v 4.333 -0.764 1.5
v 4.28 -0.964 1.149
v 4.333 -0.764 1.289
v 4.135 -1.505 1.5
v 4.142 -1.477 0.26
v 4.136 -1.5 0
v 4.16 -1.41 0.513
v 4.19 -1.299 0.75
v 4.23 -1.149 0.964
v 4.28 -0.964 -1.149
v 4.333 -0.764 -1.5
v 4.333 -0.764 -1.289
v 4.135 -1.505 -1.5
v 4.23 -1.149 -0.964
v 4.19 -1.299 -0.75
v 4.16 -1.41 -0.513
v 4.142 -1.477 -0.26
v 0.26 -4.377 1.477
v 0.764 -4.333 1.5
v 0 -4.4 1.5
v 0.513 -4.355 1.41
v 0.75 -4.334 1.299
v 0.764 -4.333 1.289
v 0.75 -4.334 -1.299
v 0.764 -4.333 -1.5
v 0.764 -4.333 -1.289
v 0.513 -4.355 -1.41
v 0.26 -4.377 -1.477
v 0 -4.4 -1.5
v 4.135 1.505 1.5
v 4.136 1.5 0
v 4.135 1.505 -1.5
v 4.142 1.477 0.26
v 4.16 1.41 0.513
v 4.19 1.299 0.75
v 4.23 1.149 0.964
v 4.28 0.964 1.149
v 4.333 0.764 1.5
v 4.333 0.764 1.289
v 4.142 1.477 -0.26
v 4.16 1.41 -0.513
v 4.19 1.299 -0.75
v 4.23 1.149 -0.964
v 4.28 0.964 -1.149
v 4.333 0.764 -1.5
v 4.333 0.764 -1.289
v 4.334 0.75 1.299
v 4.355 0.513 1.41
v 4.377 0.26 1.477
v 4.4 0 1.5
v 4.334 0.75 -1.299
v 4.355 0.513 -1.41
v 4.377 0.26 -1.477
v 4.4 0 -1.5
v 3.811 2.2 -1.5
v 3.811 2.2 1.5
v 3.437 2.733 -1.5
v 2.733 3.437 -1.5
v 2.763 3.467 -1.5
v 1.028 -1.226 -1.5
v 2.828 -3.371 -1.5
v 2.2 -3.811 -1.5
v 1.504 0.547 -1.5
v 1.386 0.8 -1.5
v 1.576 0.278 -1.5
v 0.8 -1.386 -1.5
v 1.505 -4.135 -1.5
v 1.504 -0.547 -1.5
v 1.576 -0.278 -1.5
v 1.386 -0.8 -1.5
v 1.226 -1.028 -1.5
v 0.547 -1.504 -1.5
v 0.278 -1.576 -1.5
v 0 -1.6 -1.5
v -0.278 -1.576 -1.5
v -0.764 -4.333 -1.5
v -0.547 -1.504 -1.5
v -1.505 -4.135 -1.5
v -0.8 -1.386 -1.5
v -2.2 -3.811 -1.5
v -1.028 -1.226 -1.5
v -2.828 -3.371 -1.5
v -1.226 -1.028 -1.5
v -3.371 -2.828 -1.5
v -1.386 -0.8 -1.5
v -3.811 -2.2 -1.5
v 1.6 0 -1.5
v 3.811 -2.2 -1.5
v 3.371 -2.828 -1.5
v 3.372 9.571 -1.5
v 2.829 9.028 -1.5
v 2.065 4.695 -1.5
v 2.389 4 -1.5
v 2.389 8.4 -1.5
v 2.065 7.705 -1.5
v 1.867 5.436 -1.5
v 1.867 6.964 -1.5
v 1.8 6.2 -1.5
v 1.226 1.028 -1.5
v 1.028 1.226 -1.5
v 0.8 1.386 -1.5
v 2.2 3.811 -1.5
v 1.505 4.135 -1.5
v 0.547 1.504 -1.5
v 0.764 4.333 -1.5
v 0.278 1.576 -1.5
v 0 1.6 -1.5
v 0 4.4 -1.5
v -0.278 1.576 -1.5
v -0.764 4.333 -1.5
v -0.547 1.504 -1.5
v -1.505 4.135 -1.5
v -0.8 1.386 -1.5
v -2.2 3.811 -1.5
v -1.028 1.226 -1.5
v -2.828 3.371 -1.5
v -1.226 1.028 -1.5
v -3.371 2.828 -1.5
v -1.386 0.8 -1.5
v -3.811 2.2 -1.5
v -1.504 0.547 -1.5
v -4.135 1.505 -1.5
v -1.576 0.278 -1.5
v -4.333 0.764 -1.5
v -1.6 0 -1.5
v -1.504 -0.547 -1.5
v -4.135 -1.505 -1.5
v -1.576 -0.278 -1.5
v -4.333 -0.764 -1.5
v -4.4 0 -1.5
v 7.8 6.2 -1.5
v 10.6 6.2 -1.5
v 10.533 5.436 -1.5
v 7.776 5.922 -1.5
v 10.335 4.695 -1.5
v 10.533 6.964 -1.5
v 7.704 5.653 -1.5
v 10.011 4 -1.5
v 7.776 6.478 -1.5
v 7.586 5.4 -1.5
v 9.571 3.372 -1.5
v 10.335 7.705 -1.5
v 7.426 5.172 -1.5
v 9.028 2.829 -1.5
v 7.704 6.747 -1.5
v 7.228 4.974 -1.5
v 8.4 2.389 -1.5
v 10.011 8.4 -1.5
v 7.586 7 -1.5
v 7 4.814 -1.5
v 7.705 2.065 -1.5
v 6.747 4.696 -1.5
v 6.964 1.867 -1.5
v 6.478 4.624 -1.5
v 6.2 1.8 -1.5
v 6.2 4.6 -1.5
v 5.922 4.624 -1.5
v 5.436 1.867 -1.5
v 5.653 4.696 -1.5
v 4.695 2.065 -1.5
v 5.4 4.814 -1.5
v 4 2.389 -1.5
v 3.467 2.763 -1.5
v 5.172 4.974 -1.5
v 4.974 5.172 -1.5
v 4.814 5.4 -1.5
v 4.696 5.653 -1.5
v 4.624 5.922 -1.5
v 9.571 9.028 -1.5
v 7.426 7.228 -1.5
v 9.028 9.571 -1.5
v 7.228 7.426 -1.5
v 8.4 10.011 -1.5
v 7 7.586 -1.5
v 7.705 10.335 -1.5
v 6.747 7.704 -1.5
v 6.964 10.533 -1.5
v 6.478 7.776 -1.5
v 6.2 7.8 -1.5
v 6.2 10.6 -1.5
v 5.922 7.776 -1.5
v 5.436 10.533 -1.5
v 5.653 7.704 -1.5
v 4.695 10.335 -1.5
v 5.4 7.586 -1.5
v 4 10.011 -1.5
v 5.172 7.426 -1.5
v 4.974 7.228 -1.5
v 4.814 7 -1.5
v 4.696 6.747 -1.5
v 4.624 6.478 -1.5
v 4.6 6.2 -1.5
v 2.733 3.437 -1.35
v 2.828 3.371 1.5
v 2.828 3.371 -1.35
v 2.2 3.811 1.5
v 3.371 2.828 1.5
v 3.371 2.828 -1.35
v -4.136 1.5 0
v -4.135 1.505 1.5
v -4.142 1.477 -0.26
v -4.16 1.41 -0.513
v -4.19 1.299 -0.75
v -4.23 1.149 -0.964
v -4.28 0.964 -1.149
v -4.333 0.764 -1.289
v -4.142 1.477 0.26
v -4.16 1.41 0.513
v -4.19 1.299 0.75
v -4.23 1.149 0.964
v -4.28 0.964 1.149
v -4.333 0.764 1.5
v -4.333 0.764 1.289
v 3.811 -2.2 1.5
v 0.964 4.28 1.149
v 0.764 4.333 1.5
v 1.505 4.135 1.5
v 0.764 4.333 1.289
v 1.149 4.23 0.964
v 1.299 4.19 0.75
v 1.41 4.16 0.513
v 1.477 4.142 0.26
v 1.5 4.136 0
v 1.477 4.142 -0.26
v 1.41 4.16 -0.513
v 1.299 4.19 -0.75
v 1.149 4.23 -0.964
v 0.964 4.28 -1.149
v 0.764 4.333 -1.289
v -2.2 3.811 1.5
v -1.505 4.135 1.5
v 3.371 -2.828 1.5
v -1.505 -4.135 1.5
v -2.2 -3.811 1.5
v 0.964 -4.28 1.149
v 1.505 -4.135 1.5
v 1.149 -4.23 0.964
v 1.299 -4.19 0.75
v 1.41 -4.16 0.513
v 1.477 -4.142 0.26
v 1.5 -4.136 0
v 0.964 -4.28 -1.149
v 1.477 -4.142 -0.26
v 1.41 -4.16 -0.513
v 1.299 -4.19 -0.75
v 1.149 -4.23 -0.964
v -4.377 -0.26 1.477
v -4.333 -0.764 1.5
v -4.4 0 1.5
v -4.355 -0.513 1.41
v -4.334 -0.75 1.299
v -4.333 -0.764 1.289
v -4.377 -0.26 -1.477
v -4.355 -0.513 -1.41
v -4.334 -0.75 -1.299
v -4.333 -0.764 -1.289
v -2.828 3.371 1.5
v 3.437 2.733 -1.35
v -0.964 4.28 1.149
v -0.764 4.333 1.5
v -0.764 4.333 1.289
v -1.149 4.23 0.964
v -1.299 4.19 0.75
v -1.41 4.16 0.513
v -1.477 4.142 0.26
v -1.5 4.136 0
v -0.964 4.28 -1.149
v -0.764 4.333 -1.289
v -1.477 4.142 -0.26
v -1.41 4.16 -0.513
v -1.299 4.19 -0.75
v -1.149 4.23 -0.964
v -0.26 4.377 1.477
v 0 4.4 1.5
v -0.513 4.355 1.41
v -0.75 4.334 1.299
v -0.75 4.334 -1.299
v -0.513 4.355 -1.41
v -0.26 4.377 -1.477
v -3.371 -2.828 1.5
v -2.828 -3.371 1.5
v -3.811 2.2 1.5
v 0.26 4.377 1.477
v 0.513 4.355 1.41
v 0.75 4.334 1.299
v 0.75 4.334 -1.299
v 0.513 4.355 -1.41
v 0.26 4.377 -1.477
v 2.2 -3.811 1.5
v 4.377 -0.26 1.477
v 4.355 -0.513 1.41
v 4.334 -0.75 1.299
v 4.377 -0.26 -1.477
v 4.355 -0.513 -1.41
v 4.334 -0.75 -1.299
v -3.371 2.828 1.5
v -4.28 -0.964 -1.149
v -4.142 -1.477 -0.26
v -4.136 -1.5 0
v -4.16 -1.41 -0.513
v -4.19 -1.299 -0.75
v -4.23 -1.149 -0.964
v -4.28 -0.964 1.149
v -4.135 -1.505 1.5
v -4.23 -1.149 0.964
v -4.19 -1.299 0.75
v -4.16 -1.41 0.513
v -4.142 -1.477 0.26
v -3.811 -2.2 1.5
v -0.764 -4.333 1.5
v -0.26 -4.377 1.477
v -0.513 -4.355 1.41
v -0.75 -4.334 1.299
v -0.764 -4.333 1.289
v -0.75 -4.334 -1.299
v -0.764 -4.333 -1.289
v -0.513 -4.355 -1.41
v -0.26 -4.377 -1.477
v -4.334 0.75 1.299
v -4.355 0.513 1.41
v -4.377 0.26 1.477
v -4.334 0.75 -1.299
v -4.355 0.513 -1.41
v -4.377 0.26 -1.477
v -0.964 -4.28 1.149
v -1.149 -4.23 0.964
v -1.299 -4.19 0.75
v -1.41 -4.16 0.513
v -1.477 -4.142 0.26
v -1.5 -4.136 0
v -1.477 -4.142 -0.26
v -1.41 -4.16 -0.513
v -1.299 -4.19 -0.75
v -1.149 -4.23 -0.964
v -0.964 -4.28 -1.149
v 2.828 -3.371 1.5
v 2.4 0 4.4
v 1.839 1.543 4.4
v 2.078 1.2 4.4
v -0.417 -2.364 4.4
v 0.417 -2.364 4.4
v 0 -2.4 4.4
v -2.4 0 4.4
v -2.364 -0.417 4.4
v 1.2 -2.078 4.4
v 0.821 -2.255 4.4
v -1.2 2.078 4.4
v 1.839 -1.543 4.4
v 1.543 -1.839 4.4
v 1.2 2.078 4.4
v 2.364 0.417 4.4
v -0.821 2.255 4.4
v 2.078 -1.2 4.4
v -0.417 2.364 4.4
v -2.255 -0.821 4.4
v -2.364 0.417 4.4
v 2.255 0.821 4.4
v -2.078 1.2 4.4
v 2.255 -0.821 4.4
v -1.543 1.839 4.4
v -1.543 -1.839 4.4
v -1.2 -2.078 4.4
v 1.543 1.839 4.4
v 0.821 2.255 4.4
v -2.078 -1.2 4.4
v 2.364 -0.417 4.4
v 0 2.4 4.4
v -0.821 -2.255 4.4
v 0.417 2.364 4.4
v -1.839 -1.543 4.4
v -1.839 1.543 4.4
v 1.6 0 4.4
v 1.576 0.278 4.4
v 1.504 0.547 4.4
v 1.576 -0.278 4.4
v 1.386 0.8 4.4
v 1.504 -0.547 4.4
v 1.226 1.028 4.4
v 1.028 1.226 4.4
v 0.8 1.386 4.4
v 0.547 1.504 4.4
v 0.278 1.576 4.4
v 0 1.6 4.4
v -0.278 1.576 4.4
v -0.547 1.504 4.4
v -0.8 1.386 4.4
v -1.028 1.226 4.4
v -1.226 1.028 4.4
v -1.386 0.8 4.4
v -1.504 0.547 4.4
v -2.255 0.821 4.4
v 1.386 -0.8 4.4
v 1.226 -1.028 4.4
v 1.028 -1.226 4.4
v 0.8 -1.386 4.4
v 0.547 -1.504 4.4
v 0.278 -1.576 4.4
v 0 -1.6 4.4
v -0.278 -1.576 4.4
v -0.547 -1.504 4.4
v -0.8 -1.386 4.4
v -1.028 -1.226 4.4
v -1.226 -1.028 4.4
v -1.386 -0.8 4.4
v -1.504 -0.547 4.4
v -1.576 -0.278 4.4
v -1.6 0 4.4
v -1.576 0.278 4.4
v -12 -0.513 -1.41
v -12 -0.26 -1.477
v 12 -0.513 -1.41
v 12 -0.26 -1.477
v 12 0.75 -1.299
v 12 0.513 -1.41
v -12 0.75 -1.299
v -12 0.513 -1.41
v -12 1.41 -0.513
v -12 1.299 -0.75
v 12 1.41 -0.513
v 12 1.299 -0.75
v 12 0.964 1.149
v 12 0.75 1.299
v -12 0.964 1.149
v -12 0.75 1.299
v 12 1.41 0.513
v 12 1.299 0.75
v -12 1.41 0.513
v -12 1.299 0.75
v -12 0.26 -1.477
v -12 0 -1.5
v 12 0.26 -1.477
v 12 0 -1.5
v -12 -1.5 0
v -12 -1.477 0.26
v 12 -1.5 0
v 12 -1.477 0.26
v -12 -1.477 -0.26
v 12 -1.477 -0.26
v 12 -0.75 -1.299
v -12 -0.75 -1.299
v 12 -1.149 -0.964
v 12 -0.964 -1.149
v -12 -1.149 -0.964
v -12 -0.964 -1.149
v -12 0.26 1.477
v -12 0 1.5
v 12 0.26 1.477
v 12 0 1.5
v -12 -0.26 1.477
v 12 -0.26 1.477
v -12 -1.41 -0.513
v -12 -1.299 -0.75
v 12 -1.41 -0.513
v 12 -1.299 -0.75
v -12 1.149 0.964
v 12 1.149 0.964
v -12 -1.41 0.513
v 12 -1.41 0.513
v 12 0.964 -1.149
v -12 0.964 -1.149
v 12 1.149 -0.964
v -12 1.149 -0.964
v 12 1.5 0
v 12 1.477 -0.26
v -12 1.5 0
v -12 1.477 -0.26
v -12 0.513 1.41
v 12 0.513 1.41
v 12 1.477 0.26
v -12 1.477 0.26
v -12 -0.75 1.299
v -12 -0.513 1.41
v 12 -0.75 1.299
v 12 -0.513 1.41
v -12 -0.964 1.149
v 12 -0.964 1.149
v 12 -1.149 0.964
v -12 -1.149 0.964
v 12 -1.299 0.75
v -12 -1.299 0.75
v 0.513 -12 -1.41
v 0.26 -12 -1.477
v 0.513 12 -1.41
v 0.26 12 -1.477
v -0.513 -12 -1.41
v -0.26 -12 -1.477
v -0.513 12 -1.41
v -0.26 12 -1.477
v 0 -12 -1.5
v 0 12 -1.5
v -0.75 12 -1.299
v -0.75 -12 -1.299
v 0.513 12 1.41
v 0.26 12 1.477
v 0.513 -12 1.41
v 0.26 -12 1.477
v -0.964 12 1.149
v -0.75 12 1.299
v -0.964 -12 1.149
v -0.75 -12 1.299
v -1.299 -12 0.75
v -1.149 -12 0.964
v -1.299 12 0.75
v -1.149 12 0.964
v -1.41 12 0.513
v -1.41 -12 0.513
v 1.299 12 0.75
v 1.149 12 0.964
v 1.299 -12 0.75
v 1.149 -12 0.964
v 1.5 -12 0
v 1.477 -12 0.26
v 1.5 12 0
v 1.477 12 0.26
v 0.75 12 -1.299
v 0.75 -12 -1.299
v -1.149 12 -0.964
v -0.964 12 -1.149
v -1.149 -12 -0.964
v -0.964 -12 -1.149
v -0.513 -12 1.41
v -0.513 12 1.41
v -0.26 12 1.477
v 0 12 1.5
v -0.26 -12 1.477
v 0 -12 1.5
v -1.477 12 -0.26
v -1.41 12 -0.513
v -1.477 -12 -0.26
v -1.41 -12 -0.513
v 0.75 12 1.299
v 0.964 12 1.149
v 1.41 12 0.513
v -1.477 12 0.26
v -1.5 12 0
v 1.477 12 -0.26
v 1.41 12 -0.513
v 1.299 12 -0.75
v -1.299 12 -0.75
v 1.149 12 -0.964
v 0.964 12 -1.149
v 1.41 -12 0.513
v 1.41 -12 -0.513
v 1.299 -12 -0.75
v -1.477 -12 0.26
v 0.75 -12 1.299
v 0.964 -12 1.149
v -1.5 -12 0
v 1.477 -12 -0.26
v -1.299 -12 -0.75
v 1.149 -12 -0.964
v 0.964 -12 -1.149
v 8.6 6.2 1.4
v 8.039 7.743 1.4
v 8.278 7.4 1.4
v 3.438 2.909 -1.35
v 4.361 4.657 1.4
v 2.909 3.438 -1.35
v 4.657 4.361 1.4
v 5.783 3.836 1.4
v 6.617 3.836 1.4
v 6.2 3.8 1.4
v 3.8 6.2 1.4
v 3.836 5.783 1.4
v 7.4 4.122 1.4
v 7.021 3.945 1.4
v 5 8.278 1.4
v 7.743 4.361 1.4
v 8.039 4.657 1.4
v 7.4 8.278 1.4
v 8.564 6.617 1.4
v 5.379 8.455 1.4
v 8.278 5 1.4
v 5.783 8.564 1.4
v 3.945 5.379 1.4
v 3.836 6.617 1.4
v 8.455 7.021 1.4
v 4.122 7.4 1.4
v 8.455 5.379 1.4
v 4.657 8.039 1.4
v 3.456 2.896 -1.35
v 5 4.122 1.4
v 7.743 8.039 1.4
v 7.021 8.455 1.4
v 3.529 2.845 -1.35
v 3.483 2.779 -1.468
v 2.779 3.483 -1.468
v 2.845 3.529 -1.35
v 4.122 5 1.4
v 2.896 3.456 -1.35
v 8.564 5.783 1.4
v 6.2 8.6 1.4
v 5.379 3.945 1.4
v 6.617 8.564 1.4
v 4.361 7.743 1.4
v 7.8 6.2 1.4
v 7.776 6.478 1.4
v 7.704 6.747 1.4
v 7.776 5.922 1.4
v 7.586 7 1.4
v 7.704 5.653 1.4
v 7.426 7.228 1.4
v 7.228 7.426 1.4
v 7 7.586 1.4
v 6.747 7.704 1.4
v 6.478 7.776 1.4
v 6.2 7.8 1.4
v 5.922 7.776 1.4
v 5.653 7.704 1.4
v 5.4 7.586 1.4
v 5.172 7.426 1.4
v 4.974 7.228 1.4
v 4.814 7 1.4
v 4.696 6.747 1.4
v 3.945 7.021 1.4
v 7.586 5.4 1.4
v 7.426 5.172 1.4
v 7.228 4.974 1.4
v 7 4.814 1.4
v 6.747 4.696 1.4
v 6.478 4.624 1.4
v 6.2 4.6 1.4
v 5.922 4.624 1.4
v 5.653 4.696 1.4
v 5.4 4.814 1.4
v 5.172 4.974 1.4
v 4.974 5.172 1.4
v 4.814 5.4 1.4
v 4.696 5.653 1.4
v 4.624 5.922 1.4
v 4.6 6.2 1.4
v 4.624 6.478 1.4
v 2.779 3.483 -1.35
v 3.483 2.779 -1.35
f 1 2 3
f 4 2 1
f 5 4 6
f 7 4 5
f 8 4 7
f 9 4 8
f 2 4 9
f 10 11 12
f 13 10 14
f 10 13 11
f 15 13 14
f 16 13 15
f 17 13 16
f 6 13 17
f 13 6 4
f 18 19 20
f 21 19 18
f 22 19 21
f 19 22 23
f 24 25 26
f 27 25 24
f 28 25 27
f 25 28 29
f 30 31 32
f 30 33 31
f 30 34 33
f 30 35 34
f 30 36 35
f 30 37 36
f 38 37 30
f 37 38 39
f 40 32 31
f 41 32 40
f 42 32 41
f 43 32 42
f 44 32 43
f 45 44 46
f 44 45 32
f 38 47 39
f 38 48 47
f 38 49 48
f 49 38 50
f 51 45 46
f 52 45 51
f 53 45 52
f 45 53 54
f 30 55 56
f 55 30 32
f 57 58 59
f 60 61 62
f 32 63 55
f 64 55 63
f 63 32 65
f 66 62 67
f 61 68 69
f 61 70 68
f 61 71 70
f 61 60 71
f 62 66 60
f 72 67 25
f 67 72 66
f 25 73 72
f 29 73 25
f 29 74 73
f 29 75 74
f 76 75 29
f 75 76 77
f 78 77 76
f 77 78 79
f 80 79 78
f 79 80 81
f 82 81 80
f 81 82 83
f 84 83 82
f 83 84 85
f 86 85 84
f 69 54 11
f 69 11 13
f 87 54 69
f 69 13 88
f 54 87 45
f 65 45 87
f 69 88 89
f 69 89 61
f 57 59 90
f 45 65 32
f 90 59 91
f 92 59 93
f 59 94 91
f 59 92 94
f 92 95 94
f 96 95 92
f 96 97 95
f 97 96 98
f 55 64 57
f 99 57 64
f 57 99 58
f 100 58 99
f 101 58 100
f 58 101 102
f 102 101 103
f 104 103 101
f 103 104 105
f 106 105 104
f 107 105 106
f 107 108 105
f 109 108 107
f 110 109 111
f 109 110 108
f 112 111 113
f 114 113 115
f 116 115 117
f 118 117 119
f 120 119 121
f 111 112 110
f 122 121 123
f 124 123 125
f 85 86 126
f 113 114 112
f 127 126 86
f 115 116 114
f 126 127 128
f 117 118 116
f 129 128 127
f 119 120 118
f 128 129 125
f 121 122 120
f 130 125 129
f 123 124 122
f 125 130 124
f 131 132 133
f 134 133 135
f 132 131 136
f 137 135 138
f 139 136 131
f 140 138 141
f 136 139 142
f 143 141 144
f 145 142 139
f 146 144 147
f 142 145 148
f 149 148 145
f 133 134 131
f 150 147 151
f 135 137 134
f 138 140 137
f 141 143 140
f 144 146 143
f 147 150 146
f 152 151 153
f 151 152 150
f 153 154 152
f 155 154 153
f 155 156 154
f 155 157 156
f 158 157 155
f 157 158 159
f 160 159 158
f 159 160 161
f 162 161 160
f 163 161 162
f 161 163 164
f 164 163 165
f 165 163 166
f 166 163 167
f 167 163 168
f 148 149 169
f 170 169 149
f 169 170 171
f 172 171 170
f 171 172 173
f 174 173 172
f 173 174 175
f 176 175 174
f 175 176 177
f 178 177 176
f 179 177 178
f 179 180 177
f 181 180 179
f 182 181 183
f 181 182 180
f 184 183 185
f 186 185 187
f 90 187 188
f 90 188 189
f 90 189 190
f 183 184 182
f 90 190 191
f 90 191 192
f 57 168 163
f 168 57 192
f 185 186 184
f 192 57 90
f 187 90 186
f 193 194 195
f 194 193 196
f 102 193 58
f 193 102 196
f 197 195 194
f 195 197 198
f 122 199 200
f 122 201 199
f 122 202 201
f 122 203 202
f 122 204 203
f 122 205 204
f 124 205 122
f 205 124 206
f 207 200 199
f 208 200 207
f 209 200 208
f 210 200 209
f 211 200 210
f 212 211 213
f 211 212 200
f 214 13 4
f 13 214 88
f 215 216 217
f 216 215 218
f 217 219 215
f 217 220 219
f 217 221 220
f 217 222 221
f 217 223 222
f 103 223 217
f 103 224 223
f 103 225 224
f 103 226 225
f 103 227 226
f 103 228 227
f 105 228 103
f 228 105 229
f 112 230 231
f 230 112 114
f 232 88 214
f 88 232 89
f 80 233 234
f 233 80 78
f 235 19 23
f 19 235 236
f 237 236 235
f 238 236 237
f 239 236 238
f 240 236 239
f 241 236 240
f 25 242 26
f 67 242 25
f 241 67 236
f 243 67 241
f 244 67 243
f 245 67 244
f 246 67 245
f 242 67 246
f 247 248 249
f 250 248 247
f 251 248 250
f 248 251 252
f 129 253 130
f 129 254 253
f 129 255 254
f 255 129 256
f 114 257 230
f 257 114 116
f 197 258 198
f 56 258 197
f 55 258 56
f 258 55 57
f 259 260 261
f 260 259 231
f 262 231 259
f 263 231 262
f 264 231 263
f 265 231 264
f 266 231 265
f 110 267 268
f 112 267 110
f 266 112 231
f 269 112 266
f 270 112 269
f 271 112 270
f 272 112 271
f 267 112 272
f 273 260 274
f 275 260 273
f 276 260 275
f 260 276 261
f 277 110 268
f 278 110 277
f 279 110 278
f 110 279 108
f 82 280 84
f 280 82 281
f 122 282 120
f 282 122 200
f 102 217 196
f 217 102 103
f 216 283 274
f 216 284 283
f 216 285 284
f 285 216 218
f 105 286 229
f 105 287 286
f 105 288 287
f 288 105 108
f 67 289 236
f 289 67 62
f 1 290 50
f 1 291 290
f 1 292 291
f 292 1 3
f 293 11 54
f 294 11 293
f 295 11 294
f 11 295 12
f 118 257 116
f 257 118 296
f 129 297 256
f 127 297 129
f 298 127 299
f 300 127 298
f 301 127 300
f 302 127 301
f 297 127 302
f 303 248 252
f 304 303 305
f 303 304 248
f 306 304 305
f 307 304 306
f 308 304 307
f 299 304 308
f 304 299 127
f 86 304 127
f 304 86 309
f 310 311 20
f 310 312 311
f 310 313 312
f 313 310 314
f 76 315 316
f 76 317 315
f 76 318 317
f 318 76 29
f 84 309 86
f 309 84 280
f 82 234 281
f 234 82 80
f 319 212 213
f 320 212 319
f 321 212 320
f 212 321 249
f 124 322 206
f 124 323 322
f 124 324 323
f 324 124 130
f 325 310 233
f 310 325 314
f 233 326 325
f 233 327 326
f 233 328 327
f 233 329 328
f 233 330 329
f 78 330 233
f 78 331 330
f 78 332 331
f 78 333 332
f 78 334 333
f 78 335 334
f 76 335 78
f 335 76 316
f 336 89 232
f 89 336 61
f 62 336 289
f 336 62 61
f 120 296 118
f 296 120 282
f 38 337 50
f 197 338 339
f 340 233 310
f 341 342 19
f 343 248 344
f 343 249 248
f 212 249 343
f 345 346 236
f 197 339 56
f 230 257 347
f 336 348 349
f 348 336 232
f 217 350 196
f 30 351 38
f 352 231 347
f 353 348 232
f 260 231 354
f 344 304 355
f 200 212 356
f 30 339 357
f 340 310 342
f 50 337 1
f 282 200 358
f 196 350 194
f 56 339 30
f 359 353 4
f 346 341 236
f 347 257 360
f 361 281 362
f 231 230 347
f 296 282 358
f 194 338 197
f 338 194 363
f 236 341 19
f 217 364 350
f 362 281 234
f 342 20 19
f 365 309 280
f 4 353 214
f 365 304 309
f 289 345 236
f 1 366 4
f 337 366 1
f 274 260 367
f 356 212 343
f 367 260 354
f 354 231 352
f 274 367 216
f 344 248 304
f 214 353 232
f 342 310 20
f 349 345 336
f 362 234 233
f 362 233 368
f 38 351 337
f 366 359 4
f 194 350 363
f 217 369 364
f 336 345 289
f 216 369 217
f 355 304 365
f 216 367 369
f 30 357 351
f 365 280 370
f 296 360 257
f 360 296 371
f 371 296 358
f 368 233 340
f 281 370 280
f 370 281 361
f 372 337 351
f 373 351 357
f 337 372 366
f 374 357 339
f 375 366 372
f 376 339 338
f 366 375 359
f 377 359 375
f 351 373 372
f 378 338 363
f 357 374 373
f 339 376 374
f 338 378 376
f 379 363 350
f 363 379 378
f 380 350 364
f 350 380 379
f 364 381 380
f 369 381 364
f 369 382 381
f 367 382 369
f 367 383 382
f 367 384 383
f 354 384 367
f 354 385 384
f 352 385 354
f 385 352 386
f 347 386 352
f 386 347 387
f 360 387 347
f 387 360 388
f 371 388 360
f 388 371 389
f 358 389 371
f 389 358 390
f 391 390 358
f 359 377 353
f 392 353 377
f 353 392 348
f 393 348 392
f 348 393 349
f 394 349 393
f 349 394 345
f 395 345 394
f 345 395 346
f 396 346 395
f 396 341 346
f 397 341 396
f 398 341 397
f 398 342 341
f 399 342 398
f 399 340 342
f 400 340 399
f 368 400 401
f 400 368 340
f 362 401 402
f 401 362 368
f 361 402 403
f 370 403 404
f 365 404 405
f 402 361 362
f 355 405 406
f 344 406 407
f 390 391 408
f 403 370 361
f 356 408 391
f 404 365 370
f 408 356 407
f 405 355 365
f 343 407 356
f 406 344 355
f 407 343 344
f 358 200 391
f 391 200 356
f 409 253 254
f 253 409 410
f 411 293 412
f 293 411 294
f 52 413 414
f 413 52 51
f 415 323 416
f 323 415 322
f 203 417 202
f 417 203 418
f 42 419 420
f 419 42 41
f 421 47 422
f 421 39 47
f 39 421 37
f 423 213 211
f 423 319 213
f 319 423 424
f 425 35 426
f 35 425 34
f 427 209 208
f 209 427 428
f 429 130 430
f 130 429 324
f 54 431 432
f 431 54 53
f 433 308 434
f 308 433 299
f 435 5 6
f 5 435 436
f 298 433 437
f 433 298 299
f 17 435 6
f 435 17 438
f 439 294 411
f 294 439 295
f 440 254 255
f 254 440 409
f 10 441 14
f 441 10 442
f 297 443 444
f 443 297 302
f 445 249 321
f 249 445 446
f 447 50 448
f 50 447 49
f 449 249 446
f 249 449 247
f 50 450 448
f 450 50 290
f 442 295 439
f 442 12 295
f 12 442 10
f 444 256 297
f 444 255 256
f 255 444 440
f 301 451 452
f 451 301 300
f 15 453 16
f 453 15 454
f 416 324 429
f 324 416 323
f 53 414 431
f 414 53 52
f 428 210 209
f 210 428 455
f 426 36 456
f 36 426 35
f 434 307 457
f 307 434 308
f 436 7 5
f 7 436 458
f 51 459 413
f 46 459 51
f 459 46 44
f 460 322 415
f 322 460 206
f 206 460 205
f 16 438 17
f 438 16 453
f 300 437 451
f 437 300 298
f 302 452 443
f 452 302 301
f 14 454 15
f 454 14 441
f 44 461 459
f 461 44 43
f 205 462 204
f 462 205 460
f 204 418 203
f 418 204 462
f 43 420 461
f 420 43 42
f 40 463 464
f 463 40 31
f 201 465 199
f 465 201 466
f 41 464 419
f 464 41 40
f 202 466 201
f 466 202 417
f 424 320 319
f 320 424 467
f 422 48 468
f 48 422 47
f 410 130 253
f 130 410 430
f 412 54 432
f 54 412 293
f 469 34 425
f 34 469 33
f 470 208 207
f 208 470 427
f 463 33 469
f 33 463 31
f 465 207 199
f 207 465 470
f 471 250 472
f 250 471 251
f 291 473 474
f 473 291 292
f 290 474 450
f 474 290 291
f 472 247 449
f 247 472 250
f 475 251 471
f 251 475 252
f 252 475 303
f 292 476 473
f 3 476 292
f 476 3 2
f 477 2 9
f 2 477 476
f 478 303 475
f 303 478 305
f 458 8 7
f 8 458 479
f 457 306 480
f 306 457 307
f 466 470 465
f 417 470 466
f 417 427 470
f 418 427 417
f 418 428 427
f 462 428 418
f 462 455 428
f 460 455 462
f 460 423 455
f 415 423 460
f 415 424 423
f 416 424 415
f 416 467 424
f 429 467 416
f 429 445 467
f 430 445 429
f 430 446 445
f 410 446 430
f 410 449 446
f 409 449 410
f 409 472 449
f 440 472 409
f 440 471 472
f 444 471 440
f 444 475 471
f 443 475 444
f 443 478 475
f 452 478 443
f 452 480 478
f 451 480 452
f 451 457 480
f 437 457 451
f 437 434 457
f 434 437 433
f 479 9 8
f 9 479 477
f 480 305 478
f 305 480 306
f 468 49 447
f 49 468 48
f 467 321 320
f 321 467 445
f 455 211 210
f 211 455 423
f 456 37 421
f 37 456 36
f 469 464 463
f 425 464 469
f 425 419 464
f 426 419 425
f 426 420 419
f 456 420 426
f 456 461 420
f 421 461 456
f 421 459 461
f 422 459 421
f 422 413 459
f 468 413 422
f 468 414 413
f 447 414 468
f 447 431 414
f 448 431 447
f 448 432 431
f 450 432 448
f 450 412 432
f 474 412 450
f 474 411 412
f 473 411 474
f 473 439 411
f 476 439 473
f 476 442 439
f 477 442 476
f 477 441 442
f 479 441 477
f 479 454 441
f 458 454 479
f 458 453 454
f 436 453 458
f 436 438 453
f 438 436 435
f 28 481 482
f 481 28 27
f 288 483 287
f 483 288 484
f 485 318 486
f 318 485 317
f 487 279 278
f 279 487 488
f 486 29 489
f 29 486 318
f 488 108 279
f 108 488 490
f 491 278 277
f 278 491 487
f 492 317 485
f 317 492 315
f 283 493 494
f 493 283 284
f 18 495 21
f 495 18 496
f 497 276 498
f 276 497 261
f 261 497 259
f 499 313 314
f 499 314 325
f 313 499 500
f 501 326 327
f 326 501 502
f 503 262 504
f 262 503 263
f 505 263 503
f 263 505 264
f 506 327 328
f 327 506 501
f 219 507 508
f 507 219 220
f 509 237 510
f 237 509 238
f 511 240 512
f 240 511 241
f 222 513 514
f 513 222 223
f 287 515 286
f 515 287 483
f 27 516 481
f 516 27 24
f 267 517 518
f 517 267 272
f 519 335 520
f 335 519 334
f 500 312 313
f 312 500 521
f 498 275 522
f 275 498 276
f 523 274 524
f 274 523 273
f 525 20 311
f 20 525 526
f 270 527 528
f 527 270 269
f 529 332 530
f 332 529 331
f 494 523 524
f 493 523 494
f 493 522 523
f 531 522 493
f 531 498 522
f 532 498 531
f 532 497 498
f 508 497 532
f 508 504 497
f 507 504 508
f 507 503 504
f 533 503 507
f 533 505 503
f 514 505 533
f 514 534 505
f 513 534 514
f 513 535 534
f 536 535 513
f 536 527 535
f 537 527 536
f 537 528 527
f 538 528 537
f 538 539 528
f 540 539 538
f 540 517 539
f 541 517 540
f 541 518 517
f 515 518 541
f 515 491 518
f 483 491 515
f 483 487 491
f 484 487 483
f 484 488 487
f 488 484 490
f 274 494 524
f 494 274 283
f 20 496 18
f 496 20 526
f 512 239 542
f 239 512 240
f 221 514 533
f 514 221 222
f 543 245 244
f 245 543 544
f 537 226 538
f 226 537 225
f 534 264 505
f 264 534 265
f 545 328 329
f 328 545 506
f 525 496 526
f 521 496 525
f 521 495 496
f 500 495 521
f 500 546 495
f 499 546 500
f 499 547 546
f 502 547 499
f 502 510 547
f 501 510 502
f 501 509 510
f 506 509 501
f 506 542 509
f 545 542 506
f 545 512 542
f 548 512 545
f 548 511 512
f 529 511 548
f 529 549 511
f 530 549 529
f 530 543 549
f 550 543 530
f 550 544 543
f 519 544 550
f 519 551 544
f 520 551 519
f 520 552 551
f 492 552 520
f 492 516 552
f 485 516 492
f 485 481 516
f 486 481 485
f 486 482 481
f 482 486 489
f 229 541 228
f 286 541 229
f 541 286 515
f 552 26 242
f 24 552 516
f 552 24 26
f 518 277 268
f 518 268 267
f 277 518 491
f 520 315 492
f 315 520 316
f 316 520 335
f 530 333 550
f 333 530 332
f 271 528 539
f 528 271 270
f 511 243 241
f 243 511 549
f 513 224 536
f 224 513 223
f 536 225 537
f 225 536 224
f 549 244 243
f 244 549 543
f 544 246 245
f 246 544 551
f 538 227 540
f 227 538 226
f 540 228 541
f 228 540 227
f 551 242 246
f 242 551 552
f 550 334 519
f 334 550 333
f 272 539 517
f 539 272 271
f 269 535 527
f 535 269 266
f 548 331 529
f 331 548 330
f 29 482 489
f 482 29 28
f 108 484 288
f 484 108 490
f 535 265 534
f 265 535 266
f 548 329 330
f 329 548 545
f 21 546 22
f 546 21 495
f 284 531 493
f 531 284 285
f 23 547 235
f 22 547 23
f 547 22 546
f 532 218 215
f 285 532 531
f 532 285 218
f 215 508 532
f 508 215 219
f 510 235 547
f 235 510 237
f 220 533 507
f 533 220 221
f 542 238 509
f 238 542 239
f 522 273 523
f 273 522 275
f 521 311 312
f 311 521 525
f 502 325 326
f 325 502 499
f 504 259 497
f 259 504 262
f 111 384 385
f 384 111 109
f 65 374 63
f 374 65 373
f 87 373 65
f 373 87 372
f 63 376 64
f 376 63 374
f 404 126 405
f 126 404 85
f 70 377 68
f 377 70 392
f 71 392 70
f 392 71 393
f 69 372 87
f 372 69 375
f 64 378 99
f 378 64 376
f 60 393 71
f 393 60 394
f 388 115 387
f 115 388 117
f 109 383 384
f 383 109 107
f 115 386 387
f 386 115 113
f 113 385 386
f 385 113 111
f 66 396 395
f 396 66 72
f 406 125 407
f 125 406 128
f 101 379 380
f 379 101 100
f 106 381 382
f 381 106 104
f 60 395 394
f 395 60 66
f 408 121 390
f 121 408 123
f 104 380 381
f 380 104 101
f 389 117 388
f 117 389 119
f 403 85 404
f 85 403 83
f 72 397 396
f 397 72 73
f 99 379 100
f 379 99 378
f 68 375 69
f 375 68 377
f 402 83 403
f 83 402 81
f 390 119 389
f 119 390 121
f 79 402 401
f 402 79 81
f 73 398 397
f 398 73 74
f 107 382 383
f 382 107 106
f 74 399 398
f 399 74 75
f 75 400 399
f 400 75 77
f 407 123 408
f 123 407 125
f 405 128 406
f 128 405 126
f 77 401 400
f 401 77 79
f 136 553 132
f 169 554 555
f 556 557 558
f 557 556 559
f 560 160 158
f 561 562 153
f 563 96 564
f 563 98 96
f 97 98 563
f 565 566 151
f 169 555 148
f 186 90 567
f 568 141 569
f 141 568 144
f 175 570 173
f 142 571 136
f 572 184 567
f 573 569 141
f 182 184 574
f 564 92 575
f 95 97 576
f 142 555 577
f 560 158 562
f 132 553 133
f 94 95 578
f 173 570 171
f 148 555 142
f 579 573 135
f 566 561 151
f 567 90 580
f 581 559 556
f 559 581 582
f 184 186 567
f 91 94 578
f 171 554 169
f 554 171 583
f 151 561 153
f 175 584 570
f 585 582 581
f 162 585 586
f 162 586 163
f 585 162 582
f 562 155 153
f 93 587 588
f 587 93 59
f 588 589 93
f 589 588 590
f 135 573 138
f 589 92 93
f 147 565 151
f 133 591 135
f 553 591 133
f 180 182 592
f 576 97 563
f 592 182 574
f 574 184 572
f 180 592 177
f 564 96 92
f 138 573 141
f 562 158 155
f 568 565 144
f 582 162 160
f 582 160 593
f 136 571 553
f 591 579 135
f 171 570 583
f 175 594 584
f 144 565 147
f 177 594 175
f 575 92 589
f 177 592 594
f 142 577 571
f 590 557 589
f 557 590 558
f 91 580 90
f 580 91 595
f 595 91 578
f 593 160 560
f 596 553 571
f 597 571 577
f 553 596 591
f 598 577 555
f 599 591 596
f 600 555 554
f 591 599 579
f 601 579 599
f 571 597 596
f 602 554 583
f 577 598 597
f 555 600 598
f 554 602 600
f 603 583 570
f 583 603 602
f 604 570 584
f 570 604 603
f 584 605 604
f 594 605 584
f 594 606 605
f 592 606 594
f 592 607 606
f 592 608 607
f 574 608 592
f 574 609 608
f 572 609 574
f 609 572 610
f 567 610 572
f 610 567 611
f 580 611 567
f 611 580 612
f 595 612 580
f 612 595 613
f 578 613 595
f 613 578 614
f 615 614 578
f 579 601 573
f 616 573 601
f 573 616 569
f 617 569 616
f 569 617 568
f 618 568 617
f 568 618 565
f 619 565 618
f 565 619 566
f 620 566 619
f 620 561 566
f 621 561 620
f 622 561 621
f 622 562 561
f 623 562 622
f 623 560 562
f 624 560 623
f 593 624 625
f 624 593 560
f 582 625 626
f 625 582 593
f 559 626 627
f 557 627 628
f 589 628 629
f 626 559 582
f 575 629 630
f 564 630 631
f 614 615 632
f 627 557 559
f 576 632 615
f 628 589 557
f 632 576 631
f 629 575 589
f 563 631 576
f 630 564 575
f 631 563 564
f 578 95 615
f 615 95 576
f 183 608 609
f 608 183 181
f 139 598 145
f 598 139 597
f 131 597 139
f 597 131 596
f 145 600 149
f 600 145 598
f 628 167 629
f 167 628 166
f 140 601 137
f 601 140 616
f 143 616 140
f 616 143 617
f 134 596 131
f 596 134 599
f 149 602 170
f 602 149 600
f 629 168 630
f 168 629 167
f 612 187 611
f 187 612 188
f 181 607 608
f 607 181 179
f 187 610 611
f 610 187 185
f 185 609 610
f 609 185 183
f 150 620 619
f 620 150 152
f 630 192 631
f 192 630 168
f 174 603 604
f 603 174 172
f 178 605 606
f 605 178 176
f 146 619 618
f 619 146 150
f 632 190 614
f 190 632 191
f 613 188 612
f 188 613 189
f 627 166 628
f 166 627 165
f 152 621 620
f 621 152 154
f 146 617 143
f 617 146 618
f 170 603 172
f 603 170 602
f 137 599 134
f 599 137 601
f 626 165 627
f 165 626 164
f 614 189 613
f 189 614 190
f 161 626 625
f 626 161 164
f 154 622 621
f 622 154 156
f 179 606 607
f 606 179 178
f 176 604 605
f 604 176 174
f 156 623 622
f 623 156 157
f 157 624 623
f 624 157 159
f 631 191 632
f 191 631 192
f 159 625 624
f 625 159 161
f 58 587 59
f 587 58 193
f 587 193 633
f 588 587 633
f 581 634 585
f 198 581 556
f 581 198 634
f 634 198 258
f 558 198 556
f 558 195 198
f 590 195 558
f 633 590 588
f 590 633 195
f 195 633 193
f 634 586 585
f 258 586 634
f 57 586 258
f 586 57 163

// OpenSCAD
   $fn=36;  
//  
// difference(){  
//  union(){
// gear3();
//    
//   translate([0,0,2.5+3])       import("22.stl",convexity=100);
// 
//     translate([0,0,-2.5])cylinder(8.1,7.4,7.4);
//
// 
// }
//   
//
//
//  translate([0,0,-10])cylinder(46,1.6,1.6);
//}
//
////union(){
////translate([40,0,0])cage();
////translate([40,0,0]) rotate([180,0,90])cage();
////}
////   minidiff();
union(){
rotate([00,0,0])cuff();
 }

////rotate([90,0,0])cage();
//
// translate([0,0,00])rotate([0,0,0])gear1();

module cage()
{$fn=36;
    
    
    intersection(){union(){
rotate([0,0,90])translate([0,-8.5,0])rotate([90,0,0])  cagebar();
rotate([0,0,-90])translate([0,-8.5,0])rotate([90,0,0])  cagebar();
    }
        o=.5;
    linear_extrude(6,center=true)     offset(o)offset(-o) square(21,center=true);
    }
        
        
        
    }
    module cagebar(){
        
        
            o=.5;
  linear_extrude(2,convexity=100) offset(o)offset(-o) difference(){
    square([35,5],center=true);
    circle(1.5);
  translate([0,2,0])  circle(1.8);
        
        }}
 module minidiff(){
o=4.7;
rotate([-90,  0,0])translate([0,0,-o])gear2();
rotate([90,  0,0])translate([0,0,-o])gear2();
rotate([0, 90,0])translate([0,0,-o])gear2();
rotate([0,-90,0])translate([0,0,-o])gear2();
}

module gear2(){
    
    translate([0,0,-1.60])
    union(){
            $fn=36;
    difference(){
        
 
        mirror([0,0,1])cylinder(3.25,4.5,4.5,center=true );
 
 
        
         cylinder(8,1.6,1.6,center=true);
        }
   import("22.stl");}
 
}
module cuff(){
     
union(){    $fn=36;
    difference(){
        
 union(){
      translate([0,0,-1.5])cylinder(3,4.4,4.4  );
      translate([0,0,-1.5+3])cylinder(2.9,4.4,2.4  );
 
     rotate([0,90,0])cylinder(24,1.5,1.5,center=true);
     rotate([0,90,90])cylinder(24,1.5,1.5,center=true);
     }
        
         cylinder(12,1.6,1.6,center=true);
        }
    
            translate([6.2,6.2,0])   difference(){
        

      translate([0,0,-1.5])cylinder(2.9,4.4,2.4  );
 
     cylinder(12,1.6,1.6,center=true);
     }
        
       translate([6.2,6.2,-3]*.5)  cylinder(.15,.5,.5);
   
    
    }
         }
    
    
    module gear1(){
        $convexity=100;
      difference()
    {   linear_extrude(5,center=true,convexity=100 )   projection() scale(1.25)import("1.stl");
                    o=.5;
     
     linear_extrude(26,center=true,convexity=100)     offset(o)offset(-o) square(17,center=true);
        gearinset();
     rotate([0,0,090]) gearinset();
     
   
    }
    
    }
        module gear3(){
        $convexity=100;
      linear_extrude(5,center=true,convexity=100 )  difference()
    {    projection() scale(1.25)import("1.stl");
    circle(1.7);
    }
    
    }
    
module    gearinset(){

   $fn=36;
            o=-.5;
  rotate([90,0,90])linear_extrude(25,center=true,convexity=100) offset(o, $fn=16)offset(-o, $fn=36) union(){
     circle(1.5);
  translate([0,2,0])  circle(1.8);
        
        }}
